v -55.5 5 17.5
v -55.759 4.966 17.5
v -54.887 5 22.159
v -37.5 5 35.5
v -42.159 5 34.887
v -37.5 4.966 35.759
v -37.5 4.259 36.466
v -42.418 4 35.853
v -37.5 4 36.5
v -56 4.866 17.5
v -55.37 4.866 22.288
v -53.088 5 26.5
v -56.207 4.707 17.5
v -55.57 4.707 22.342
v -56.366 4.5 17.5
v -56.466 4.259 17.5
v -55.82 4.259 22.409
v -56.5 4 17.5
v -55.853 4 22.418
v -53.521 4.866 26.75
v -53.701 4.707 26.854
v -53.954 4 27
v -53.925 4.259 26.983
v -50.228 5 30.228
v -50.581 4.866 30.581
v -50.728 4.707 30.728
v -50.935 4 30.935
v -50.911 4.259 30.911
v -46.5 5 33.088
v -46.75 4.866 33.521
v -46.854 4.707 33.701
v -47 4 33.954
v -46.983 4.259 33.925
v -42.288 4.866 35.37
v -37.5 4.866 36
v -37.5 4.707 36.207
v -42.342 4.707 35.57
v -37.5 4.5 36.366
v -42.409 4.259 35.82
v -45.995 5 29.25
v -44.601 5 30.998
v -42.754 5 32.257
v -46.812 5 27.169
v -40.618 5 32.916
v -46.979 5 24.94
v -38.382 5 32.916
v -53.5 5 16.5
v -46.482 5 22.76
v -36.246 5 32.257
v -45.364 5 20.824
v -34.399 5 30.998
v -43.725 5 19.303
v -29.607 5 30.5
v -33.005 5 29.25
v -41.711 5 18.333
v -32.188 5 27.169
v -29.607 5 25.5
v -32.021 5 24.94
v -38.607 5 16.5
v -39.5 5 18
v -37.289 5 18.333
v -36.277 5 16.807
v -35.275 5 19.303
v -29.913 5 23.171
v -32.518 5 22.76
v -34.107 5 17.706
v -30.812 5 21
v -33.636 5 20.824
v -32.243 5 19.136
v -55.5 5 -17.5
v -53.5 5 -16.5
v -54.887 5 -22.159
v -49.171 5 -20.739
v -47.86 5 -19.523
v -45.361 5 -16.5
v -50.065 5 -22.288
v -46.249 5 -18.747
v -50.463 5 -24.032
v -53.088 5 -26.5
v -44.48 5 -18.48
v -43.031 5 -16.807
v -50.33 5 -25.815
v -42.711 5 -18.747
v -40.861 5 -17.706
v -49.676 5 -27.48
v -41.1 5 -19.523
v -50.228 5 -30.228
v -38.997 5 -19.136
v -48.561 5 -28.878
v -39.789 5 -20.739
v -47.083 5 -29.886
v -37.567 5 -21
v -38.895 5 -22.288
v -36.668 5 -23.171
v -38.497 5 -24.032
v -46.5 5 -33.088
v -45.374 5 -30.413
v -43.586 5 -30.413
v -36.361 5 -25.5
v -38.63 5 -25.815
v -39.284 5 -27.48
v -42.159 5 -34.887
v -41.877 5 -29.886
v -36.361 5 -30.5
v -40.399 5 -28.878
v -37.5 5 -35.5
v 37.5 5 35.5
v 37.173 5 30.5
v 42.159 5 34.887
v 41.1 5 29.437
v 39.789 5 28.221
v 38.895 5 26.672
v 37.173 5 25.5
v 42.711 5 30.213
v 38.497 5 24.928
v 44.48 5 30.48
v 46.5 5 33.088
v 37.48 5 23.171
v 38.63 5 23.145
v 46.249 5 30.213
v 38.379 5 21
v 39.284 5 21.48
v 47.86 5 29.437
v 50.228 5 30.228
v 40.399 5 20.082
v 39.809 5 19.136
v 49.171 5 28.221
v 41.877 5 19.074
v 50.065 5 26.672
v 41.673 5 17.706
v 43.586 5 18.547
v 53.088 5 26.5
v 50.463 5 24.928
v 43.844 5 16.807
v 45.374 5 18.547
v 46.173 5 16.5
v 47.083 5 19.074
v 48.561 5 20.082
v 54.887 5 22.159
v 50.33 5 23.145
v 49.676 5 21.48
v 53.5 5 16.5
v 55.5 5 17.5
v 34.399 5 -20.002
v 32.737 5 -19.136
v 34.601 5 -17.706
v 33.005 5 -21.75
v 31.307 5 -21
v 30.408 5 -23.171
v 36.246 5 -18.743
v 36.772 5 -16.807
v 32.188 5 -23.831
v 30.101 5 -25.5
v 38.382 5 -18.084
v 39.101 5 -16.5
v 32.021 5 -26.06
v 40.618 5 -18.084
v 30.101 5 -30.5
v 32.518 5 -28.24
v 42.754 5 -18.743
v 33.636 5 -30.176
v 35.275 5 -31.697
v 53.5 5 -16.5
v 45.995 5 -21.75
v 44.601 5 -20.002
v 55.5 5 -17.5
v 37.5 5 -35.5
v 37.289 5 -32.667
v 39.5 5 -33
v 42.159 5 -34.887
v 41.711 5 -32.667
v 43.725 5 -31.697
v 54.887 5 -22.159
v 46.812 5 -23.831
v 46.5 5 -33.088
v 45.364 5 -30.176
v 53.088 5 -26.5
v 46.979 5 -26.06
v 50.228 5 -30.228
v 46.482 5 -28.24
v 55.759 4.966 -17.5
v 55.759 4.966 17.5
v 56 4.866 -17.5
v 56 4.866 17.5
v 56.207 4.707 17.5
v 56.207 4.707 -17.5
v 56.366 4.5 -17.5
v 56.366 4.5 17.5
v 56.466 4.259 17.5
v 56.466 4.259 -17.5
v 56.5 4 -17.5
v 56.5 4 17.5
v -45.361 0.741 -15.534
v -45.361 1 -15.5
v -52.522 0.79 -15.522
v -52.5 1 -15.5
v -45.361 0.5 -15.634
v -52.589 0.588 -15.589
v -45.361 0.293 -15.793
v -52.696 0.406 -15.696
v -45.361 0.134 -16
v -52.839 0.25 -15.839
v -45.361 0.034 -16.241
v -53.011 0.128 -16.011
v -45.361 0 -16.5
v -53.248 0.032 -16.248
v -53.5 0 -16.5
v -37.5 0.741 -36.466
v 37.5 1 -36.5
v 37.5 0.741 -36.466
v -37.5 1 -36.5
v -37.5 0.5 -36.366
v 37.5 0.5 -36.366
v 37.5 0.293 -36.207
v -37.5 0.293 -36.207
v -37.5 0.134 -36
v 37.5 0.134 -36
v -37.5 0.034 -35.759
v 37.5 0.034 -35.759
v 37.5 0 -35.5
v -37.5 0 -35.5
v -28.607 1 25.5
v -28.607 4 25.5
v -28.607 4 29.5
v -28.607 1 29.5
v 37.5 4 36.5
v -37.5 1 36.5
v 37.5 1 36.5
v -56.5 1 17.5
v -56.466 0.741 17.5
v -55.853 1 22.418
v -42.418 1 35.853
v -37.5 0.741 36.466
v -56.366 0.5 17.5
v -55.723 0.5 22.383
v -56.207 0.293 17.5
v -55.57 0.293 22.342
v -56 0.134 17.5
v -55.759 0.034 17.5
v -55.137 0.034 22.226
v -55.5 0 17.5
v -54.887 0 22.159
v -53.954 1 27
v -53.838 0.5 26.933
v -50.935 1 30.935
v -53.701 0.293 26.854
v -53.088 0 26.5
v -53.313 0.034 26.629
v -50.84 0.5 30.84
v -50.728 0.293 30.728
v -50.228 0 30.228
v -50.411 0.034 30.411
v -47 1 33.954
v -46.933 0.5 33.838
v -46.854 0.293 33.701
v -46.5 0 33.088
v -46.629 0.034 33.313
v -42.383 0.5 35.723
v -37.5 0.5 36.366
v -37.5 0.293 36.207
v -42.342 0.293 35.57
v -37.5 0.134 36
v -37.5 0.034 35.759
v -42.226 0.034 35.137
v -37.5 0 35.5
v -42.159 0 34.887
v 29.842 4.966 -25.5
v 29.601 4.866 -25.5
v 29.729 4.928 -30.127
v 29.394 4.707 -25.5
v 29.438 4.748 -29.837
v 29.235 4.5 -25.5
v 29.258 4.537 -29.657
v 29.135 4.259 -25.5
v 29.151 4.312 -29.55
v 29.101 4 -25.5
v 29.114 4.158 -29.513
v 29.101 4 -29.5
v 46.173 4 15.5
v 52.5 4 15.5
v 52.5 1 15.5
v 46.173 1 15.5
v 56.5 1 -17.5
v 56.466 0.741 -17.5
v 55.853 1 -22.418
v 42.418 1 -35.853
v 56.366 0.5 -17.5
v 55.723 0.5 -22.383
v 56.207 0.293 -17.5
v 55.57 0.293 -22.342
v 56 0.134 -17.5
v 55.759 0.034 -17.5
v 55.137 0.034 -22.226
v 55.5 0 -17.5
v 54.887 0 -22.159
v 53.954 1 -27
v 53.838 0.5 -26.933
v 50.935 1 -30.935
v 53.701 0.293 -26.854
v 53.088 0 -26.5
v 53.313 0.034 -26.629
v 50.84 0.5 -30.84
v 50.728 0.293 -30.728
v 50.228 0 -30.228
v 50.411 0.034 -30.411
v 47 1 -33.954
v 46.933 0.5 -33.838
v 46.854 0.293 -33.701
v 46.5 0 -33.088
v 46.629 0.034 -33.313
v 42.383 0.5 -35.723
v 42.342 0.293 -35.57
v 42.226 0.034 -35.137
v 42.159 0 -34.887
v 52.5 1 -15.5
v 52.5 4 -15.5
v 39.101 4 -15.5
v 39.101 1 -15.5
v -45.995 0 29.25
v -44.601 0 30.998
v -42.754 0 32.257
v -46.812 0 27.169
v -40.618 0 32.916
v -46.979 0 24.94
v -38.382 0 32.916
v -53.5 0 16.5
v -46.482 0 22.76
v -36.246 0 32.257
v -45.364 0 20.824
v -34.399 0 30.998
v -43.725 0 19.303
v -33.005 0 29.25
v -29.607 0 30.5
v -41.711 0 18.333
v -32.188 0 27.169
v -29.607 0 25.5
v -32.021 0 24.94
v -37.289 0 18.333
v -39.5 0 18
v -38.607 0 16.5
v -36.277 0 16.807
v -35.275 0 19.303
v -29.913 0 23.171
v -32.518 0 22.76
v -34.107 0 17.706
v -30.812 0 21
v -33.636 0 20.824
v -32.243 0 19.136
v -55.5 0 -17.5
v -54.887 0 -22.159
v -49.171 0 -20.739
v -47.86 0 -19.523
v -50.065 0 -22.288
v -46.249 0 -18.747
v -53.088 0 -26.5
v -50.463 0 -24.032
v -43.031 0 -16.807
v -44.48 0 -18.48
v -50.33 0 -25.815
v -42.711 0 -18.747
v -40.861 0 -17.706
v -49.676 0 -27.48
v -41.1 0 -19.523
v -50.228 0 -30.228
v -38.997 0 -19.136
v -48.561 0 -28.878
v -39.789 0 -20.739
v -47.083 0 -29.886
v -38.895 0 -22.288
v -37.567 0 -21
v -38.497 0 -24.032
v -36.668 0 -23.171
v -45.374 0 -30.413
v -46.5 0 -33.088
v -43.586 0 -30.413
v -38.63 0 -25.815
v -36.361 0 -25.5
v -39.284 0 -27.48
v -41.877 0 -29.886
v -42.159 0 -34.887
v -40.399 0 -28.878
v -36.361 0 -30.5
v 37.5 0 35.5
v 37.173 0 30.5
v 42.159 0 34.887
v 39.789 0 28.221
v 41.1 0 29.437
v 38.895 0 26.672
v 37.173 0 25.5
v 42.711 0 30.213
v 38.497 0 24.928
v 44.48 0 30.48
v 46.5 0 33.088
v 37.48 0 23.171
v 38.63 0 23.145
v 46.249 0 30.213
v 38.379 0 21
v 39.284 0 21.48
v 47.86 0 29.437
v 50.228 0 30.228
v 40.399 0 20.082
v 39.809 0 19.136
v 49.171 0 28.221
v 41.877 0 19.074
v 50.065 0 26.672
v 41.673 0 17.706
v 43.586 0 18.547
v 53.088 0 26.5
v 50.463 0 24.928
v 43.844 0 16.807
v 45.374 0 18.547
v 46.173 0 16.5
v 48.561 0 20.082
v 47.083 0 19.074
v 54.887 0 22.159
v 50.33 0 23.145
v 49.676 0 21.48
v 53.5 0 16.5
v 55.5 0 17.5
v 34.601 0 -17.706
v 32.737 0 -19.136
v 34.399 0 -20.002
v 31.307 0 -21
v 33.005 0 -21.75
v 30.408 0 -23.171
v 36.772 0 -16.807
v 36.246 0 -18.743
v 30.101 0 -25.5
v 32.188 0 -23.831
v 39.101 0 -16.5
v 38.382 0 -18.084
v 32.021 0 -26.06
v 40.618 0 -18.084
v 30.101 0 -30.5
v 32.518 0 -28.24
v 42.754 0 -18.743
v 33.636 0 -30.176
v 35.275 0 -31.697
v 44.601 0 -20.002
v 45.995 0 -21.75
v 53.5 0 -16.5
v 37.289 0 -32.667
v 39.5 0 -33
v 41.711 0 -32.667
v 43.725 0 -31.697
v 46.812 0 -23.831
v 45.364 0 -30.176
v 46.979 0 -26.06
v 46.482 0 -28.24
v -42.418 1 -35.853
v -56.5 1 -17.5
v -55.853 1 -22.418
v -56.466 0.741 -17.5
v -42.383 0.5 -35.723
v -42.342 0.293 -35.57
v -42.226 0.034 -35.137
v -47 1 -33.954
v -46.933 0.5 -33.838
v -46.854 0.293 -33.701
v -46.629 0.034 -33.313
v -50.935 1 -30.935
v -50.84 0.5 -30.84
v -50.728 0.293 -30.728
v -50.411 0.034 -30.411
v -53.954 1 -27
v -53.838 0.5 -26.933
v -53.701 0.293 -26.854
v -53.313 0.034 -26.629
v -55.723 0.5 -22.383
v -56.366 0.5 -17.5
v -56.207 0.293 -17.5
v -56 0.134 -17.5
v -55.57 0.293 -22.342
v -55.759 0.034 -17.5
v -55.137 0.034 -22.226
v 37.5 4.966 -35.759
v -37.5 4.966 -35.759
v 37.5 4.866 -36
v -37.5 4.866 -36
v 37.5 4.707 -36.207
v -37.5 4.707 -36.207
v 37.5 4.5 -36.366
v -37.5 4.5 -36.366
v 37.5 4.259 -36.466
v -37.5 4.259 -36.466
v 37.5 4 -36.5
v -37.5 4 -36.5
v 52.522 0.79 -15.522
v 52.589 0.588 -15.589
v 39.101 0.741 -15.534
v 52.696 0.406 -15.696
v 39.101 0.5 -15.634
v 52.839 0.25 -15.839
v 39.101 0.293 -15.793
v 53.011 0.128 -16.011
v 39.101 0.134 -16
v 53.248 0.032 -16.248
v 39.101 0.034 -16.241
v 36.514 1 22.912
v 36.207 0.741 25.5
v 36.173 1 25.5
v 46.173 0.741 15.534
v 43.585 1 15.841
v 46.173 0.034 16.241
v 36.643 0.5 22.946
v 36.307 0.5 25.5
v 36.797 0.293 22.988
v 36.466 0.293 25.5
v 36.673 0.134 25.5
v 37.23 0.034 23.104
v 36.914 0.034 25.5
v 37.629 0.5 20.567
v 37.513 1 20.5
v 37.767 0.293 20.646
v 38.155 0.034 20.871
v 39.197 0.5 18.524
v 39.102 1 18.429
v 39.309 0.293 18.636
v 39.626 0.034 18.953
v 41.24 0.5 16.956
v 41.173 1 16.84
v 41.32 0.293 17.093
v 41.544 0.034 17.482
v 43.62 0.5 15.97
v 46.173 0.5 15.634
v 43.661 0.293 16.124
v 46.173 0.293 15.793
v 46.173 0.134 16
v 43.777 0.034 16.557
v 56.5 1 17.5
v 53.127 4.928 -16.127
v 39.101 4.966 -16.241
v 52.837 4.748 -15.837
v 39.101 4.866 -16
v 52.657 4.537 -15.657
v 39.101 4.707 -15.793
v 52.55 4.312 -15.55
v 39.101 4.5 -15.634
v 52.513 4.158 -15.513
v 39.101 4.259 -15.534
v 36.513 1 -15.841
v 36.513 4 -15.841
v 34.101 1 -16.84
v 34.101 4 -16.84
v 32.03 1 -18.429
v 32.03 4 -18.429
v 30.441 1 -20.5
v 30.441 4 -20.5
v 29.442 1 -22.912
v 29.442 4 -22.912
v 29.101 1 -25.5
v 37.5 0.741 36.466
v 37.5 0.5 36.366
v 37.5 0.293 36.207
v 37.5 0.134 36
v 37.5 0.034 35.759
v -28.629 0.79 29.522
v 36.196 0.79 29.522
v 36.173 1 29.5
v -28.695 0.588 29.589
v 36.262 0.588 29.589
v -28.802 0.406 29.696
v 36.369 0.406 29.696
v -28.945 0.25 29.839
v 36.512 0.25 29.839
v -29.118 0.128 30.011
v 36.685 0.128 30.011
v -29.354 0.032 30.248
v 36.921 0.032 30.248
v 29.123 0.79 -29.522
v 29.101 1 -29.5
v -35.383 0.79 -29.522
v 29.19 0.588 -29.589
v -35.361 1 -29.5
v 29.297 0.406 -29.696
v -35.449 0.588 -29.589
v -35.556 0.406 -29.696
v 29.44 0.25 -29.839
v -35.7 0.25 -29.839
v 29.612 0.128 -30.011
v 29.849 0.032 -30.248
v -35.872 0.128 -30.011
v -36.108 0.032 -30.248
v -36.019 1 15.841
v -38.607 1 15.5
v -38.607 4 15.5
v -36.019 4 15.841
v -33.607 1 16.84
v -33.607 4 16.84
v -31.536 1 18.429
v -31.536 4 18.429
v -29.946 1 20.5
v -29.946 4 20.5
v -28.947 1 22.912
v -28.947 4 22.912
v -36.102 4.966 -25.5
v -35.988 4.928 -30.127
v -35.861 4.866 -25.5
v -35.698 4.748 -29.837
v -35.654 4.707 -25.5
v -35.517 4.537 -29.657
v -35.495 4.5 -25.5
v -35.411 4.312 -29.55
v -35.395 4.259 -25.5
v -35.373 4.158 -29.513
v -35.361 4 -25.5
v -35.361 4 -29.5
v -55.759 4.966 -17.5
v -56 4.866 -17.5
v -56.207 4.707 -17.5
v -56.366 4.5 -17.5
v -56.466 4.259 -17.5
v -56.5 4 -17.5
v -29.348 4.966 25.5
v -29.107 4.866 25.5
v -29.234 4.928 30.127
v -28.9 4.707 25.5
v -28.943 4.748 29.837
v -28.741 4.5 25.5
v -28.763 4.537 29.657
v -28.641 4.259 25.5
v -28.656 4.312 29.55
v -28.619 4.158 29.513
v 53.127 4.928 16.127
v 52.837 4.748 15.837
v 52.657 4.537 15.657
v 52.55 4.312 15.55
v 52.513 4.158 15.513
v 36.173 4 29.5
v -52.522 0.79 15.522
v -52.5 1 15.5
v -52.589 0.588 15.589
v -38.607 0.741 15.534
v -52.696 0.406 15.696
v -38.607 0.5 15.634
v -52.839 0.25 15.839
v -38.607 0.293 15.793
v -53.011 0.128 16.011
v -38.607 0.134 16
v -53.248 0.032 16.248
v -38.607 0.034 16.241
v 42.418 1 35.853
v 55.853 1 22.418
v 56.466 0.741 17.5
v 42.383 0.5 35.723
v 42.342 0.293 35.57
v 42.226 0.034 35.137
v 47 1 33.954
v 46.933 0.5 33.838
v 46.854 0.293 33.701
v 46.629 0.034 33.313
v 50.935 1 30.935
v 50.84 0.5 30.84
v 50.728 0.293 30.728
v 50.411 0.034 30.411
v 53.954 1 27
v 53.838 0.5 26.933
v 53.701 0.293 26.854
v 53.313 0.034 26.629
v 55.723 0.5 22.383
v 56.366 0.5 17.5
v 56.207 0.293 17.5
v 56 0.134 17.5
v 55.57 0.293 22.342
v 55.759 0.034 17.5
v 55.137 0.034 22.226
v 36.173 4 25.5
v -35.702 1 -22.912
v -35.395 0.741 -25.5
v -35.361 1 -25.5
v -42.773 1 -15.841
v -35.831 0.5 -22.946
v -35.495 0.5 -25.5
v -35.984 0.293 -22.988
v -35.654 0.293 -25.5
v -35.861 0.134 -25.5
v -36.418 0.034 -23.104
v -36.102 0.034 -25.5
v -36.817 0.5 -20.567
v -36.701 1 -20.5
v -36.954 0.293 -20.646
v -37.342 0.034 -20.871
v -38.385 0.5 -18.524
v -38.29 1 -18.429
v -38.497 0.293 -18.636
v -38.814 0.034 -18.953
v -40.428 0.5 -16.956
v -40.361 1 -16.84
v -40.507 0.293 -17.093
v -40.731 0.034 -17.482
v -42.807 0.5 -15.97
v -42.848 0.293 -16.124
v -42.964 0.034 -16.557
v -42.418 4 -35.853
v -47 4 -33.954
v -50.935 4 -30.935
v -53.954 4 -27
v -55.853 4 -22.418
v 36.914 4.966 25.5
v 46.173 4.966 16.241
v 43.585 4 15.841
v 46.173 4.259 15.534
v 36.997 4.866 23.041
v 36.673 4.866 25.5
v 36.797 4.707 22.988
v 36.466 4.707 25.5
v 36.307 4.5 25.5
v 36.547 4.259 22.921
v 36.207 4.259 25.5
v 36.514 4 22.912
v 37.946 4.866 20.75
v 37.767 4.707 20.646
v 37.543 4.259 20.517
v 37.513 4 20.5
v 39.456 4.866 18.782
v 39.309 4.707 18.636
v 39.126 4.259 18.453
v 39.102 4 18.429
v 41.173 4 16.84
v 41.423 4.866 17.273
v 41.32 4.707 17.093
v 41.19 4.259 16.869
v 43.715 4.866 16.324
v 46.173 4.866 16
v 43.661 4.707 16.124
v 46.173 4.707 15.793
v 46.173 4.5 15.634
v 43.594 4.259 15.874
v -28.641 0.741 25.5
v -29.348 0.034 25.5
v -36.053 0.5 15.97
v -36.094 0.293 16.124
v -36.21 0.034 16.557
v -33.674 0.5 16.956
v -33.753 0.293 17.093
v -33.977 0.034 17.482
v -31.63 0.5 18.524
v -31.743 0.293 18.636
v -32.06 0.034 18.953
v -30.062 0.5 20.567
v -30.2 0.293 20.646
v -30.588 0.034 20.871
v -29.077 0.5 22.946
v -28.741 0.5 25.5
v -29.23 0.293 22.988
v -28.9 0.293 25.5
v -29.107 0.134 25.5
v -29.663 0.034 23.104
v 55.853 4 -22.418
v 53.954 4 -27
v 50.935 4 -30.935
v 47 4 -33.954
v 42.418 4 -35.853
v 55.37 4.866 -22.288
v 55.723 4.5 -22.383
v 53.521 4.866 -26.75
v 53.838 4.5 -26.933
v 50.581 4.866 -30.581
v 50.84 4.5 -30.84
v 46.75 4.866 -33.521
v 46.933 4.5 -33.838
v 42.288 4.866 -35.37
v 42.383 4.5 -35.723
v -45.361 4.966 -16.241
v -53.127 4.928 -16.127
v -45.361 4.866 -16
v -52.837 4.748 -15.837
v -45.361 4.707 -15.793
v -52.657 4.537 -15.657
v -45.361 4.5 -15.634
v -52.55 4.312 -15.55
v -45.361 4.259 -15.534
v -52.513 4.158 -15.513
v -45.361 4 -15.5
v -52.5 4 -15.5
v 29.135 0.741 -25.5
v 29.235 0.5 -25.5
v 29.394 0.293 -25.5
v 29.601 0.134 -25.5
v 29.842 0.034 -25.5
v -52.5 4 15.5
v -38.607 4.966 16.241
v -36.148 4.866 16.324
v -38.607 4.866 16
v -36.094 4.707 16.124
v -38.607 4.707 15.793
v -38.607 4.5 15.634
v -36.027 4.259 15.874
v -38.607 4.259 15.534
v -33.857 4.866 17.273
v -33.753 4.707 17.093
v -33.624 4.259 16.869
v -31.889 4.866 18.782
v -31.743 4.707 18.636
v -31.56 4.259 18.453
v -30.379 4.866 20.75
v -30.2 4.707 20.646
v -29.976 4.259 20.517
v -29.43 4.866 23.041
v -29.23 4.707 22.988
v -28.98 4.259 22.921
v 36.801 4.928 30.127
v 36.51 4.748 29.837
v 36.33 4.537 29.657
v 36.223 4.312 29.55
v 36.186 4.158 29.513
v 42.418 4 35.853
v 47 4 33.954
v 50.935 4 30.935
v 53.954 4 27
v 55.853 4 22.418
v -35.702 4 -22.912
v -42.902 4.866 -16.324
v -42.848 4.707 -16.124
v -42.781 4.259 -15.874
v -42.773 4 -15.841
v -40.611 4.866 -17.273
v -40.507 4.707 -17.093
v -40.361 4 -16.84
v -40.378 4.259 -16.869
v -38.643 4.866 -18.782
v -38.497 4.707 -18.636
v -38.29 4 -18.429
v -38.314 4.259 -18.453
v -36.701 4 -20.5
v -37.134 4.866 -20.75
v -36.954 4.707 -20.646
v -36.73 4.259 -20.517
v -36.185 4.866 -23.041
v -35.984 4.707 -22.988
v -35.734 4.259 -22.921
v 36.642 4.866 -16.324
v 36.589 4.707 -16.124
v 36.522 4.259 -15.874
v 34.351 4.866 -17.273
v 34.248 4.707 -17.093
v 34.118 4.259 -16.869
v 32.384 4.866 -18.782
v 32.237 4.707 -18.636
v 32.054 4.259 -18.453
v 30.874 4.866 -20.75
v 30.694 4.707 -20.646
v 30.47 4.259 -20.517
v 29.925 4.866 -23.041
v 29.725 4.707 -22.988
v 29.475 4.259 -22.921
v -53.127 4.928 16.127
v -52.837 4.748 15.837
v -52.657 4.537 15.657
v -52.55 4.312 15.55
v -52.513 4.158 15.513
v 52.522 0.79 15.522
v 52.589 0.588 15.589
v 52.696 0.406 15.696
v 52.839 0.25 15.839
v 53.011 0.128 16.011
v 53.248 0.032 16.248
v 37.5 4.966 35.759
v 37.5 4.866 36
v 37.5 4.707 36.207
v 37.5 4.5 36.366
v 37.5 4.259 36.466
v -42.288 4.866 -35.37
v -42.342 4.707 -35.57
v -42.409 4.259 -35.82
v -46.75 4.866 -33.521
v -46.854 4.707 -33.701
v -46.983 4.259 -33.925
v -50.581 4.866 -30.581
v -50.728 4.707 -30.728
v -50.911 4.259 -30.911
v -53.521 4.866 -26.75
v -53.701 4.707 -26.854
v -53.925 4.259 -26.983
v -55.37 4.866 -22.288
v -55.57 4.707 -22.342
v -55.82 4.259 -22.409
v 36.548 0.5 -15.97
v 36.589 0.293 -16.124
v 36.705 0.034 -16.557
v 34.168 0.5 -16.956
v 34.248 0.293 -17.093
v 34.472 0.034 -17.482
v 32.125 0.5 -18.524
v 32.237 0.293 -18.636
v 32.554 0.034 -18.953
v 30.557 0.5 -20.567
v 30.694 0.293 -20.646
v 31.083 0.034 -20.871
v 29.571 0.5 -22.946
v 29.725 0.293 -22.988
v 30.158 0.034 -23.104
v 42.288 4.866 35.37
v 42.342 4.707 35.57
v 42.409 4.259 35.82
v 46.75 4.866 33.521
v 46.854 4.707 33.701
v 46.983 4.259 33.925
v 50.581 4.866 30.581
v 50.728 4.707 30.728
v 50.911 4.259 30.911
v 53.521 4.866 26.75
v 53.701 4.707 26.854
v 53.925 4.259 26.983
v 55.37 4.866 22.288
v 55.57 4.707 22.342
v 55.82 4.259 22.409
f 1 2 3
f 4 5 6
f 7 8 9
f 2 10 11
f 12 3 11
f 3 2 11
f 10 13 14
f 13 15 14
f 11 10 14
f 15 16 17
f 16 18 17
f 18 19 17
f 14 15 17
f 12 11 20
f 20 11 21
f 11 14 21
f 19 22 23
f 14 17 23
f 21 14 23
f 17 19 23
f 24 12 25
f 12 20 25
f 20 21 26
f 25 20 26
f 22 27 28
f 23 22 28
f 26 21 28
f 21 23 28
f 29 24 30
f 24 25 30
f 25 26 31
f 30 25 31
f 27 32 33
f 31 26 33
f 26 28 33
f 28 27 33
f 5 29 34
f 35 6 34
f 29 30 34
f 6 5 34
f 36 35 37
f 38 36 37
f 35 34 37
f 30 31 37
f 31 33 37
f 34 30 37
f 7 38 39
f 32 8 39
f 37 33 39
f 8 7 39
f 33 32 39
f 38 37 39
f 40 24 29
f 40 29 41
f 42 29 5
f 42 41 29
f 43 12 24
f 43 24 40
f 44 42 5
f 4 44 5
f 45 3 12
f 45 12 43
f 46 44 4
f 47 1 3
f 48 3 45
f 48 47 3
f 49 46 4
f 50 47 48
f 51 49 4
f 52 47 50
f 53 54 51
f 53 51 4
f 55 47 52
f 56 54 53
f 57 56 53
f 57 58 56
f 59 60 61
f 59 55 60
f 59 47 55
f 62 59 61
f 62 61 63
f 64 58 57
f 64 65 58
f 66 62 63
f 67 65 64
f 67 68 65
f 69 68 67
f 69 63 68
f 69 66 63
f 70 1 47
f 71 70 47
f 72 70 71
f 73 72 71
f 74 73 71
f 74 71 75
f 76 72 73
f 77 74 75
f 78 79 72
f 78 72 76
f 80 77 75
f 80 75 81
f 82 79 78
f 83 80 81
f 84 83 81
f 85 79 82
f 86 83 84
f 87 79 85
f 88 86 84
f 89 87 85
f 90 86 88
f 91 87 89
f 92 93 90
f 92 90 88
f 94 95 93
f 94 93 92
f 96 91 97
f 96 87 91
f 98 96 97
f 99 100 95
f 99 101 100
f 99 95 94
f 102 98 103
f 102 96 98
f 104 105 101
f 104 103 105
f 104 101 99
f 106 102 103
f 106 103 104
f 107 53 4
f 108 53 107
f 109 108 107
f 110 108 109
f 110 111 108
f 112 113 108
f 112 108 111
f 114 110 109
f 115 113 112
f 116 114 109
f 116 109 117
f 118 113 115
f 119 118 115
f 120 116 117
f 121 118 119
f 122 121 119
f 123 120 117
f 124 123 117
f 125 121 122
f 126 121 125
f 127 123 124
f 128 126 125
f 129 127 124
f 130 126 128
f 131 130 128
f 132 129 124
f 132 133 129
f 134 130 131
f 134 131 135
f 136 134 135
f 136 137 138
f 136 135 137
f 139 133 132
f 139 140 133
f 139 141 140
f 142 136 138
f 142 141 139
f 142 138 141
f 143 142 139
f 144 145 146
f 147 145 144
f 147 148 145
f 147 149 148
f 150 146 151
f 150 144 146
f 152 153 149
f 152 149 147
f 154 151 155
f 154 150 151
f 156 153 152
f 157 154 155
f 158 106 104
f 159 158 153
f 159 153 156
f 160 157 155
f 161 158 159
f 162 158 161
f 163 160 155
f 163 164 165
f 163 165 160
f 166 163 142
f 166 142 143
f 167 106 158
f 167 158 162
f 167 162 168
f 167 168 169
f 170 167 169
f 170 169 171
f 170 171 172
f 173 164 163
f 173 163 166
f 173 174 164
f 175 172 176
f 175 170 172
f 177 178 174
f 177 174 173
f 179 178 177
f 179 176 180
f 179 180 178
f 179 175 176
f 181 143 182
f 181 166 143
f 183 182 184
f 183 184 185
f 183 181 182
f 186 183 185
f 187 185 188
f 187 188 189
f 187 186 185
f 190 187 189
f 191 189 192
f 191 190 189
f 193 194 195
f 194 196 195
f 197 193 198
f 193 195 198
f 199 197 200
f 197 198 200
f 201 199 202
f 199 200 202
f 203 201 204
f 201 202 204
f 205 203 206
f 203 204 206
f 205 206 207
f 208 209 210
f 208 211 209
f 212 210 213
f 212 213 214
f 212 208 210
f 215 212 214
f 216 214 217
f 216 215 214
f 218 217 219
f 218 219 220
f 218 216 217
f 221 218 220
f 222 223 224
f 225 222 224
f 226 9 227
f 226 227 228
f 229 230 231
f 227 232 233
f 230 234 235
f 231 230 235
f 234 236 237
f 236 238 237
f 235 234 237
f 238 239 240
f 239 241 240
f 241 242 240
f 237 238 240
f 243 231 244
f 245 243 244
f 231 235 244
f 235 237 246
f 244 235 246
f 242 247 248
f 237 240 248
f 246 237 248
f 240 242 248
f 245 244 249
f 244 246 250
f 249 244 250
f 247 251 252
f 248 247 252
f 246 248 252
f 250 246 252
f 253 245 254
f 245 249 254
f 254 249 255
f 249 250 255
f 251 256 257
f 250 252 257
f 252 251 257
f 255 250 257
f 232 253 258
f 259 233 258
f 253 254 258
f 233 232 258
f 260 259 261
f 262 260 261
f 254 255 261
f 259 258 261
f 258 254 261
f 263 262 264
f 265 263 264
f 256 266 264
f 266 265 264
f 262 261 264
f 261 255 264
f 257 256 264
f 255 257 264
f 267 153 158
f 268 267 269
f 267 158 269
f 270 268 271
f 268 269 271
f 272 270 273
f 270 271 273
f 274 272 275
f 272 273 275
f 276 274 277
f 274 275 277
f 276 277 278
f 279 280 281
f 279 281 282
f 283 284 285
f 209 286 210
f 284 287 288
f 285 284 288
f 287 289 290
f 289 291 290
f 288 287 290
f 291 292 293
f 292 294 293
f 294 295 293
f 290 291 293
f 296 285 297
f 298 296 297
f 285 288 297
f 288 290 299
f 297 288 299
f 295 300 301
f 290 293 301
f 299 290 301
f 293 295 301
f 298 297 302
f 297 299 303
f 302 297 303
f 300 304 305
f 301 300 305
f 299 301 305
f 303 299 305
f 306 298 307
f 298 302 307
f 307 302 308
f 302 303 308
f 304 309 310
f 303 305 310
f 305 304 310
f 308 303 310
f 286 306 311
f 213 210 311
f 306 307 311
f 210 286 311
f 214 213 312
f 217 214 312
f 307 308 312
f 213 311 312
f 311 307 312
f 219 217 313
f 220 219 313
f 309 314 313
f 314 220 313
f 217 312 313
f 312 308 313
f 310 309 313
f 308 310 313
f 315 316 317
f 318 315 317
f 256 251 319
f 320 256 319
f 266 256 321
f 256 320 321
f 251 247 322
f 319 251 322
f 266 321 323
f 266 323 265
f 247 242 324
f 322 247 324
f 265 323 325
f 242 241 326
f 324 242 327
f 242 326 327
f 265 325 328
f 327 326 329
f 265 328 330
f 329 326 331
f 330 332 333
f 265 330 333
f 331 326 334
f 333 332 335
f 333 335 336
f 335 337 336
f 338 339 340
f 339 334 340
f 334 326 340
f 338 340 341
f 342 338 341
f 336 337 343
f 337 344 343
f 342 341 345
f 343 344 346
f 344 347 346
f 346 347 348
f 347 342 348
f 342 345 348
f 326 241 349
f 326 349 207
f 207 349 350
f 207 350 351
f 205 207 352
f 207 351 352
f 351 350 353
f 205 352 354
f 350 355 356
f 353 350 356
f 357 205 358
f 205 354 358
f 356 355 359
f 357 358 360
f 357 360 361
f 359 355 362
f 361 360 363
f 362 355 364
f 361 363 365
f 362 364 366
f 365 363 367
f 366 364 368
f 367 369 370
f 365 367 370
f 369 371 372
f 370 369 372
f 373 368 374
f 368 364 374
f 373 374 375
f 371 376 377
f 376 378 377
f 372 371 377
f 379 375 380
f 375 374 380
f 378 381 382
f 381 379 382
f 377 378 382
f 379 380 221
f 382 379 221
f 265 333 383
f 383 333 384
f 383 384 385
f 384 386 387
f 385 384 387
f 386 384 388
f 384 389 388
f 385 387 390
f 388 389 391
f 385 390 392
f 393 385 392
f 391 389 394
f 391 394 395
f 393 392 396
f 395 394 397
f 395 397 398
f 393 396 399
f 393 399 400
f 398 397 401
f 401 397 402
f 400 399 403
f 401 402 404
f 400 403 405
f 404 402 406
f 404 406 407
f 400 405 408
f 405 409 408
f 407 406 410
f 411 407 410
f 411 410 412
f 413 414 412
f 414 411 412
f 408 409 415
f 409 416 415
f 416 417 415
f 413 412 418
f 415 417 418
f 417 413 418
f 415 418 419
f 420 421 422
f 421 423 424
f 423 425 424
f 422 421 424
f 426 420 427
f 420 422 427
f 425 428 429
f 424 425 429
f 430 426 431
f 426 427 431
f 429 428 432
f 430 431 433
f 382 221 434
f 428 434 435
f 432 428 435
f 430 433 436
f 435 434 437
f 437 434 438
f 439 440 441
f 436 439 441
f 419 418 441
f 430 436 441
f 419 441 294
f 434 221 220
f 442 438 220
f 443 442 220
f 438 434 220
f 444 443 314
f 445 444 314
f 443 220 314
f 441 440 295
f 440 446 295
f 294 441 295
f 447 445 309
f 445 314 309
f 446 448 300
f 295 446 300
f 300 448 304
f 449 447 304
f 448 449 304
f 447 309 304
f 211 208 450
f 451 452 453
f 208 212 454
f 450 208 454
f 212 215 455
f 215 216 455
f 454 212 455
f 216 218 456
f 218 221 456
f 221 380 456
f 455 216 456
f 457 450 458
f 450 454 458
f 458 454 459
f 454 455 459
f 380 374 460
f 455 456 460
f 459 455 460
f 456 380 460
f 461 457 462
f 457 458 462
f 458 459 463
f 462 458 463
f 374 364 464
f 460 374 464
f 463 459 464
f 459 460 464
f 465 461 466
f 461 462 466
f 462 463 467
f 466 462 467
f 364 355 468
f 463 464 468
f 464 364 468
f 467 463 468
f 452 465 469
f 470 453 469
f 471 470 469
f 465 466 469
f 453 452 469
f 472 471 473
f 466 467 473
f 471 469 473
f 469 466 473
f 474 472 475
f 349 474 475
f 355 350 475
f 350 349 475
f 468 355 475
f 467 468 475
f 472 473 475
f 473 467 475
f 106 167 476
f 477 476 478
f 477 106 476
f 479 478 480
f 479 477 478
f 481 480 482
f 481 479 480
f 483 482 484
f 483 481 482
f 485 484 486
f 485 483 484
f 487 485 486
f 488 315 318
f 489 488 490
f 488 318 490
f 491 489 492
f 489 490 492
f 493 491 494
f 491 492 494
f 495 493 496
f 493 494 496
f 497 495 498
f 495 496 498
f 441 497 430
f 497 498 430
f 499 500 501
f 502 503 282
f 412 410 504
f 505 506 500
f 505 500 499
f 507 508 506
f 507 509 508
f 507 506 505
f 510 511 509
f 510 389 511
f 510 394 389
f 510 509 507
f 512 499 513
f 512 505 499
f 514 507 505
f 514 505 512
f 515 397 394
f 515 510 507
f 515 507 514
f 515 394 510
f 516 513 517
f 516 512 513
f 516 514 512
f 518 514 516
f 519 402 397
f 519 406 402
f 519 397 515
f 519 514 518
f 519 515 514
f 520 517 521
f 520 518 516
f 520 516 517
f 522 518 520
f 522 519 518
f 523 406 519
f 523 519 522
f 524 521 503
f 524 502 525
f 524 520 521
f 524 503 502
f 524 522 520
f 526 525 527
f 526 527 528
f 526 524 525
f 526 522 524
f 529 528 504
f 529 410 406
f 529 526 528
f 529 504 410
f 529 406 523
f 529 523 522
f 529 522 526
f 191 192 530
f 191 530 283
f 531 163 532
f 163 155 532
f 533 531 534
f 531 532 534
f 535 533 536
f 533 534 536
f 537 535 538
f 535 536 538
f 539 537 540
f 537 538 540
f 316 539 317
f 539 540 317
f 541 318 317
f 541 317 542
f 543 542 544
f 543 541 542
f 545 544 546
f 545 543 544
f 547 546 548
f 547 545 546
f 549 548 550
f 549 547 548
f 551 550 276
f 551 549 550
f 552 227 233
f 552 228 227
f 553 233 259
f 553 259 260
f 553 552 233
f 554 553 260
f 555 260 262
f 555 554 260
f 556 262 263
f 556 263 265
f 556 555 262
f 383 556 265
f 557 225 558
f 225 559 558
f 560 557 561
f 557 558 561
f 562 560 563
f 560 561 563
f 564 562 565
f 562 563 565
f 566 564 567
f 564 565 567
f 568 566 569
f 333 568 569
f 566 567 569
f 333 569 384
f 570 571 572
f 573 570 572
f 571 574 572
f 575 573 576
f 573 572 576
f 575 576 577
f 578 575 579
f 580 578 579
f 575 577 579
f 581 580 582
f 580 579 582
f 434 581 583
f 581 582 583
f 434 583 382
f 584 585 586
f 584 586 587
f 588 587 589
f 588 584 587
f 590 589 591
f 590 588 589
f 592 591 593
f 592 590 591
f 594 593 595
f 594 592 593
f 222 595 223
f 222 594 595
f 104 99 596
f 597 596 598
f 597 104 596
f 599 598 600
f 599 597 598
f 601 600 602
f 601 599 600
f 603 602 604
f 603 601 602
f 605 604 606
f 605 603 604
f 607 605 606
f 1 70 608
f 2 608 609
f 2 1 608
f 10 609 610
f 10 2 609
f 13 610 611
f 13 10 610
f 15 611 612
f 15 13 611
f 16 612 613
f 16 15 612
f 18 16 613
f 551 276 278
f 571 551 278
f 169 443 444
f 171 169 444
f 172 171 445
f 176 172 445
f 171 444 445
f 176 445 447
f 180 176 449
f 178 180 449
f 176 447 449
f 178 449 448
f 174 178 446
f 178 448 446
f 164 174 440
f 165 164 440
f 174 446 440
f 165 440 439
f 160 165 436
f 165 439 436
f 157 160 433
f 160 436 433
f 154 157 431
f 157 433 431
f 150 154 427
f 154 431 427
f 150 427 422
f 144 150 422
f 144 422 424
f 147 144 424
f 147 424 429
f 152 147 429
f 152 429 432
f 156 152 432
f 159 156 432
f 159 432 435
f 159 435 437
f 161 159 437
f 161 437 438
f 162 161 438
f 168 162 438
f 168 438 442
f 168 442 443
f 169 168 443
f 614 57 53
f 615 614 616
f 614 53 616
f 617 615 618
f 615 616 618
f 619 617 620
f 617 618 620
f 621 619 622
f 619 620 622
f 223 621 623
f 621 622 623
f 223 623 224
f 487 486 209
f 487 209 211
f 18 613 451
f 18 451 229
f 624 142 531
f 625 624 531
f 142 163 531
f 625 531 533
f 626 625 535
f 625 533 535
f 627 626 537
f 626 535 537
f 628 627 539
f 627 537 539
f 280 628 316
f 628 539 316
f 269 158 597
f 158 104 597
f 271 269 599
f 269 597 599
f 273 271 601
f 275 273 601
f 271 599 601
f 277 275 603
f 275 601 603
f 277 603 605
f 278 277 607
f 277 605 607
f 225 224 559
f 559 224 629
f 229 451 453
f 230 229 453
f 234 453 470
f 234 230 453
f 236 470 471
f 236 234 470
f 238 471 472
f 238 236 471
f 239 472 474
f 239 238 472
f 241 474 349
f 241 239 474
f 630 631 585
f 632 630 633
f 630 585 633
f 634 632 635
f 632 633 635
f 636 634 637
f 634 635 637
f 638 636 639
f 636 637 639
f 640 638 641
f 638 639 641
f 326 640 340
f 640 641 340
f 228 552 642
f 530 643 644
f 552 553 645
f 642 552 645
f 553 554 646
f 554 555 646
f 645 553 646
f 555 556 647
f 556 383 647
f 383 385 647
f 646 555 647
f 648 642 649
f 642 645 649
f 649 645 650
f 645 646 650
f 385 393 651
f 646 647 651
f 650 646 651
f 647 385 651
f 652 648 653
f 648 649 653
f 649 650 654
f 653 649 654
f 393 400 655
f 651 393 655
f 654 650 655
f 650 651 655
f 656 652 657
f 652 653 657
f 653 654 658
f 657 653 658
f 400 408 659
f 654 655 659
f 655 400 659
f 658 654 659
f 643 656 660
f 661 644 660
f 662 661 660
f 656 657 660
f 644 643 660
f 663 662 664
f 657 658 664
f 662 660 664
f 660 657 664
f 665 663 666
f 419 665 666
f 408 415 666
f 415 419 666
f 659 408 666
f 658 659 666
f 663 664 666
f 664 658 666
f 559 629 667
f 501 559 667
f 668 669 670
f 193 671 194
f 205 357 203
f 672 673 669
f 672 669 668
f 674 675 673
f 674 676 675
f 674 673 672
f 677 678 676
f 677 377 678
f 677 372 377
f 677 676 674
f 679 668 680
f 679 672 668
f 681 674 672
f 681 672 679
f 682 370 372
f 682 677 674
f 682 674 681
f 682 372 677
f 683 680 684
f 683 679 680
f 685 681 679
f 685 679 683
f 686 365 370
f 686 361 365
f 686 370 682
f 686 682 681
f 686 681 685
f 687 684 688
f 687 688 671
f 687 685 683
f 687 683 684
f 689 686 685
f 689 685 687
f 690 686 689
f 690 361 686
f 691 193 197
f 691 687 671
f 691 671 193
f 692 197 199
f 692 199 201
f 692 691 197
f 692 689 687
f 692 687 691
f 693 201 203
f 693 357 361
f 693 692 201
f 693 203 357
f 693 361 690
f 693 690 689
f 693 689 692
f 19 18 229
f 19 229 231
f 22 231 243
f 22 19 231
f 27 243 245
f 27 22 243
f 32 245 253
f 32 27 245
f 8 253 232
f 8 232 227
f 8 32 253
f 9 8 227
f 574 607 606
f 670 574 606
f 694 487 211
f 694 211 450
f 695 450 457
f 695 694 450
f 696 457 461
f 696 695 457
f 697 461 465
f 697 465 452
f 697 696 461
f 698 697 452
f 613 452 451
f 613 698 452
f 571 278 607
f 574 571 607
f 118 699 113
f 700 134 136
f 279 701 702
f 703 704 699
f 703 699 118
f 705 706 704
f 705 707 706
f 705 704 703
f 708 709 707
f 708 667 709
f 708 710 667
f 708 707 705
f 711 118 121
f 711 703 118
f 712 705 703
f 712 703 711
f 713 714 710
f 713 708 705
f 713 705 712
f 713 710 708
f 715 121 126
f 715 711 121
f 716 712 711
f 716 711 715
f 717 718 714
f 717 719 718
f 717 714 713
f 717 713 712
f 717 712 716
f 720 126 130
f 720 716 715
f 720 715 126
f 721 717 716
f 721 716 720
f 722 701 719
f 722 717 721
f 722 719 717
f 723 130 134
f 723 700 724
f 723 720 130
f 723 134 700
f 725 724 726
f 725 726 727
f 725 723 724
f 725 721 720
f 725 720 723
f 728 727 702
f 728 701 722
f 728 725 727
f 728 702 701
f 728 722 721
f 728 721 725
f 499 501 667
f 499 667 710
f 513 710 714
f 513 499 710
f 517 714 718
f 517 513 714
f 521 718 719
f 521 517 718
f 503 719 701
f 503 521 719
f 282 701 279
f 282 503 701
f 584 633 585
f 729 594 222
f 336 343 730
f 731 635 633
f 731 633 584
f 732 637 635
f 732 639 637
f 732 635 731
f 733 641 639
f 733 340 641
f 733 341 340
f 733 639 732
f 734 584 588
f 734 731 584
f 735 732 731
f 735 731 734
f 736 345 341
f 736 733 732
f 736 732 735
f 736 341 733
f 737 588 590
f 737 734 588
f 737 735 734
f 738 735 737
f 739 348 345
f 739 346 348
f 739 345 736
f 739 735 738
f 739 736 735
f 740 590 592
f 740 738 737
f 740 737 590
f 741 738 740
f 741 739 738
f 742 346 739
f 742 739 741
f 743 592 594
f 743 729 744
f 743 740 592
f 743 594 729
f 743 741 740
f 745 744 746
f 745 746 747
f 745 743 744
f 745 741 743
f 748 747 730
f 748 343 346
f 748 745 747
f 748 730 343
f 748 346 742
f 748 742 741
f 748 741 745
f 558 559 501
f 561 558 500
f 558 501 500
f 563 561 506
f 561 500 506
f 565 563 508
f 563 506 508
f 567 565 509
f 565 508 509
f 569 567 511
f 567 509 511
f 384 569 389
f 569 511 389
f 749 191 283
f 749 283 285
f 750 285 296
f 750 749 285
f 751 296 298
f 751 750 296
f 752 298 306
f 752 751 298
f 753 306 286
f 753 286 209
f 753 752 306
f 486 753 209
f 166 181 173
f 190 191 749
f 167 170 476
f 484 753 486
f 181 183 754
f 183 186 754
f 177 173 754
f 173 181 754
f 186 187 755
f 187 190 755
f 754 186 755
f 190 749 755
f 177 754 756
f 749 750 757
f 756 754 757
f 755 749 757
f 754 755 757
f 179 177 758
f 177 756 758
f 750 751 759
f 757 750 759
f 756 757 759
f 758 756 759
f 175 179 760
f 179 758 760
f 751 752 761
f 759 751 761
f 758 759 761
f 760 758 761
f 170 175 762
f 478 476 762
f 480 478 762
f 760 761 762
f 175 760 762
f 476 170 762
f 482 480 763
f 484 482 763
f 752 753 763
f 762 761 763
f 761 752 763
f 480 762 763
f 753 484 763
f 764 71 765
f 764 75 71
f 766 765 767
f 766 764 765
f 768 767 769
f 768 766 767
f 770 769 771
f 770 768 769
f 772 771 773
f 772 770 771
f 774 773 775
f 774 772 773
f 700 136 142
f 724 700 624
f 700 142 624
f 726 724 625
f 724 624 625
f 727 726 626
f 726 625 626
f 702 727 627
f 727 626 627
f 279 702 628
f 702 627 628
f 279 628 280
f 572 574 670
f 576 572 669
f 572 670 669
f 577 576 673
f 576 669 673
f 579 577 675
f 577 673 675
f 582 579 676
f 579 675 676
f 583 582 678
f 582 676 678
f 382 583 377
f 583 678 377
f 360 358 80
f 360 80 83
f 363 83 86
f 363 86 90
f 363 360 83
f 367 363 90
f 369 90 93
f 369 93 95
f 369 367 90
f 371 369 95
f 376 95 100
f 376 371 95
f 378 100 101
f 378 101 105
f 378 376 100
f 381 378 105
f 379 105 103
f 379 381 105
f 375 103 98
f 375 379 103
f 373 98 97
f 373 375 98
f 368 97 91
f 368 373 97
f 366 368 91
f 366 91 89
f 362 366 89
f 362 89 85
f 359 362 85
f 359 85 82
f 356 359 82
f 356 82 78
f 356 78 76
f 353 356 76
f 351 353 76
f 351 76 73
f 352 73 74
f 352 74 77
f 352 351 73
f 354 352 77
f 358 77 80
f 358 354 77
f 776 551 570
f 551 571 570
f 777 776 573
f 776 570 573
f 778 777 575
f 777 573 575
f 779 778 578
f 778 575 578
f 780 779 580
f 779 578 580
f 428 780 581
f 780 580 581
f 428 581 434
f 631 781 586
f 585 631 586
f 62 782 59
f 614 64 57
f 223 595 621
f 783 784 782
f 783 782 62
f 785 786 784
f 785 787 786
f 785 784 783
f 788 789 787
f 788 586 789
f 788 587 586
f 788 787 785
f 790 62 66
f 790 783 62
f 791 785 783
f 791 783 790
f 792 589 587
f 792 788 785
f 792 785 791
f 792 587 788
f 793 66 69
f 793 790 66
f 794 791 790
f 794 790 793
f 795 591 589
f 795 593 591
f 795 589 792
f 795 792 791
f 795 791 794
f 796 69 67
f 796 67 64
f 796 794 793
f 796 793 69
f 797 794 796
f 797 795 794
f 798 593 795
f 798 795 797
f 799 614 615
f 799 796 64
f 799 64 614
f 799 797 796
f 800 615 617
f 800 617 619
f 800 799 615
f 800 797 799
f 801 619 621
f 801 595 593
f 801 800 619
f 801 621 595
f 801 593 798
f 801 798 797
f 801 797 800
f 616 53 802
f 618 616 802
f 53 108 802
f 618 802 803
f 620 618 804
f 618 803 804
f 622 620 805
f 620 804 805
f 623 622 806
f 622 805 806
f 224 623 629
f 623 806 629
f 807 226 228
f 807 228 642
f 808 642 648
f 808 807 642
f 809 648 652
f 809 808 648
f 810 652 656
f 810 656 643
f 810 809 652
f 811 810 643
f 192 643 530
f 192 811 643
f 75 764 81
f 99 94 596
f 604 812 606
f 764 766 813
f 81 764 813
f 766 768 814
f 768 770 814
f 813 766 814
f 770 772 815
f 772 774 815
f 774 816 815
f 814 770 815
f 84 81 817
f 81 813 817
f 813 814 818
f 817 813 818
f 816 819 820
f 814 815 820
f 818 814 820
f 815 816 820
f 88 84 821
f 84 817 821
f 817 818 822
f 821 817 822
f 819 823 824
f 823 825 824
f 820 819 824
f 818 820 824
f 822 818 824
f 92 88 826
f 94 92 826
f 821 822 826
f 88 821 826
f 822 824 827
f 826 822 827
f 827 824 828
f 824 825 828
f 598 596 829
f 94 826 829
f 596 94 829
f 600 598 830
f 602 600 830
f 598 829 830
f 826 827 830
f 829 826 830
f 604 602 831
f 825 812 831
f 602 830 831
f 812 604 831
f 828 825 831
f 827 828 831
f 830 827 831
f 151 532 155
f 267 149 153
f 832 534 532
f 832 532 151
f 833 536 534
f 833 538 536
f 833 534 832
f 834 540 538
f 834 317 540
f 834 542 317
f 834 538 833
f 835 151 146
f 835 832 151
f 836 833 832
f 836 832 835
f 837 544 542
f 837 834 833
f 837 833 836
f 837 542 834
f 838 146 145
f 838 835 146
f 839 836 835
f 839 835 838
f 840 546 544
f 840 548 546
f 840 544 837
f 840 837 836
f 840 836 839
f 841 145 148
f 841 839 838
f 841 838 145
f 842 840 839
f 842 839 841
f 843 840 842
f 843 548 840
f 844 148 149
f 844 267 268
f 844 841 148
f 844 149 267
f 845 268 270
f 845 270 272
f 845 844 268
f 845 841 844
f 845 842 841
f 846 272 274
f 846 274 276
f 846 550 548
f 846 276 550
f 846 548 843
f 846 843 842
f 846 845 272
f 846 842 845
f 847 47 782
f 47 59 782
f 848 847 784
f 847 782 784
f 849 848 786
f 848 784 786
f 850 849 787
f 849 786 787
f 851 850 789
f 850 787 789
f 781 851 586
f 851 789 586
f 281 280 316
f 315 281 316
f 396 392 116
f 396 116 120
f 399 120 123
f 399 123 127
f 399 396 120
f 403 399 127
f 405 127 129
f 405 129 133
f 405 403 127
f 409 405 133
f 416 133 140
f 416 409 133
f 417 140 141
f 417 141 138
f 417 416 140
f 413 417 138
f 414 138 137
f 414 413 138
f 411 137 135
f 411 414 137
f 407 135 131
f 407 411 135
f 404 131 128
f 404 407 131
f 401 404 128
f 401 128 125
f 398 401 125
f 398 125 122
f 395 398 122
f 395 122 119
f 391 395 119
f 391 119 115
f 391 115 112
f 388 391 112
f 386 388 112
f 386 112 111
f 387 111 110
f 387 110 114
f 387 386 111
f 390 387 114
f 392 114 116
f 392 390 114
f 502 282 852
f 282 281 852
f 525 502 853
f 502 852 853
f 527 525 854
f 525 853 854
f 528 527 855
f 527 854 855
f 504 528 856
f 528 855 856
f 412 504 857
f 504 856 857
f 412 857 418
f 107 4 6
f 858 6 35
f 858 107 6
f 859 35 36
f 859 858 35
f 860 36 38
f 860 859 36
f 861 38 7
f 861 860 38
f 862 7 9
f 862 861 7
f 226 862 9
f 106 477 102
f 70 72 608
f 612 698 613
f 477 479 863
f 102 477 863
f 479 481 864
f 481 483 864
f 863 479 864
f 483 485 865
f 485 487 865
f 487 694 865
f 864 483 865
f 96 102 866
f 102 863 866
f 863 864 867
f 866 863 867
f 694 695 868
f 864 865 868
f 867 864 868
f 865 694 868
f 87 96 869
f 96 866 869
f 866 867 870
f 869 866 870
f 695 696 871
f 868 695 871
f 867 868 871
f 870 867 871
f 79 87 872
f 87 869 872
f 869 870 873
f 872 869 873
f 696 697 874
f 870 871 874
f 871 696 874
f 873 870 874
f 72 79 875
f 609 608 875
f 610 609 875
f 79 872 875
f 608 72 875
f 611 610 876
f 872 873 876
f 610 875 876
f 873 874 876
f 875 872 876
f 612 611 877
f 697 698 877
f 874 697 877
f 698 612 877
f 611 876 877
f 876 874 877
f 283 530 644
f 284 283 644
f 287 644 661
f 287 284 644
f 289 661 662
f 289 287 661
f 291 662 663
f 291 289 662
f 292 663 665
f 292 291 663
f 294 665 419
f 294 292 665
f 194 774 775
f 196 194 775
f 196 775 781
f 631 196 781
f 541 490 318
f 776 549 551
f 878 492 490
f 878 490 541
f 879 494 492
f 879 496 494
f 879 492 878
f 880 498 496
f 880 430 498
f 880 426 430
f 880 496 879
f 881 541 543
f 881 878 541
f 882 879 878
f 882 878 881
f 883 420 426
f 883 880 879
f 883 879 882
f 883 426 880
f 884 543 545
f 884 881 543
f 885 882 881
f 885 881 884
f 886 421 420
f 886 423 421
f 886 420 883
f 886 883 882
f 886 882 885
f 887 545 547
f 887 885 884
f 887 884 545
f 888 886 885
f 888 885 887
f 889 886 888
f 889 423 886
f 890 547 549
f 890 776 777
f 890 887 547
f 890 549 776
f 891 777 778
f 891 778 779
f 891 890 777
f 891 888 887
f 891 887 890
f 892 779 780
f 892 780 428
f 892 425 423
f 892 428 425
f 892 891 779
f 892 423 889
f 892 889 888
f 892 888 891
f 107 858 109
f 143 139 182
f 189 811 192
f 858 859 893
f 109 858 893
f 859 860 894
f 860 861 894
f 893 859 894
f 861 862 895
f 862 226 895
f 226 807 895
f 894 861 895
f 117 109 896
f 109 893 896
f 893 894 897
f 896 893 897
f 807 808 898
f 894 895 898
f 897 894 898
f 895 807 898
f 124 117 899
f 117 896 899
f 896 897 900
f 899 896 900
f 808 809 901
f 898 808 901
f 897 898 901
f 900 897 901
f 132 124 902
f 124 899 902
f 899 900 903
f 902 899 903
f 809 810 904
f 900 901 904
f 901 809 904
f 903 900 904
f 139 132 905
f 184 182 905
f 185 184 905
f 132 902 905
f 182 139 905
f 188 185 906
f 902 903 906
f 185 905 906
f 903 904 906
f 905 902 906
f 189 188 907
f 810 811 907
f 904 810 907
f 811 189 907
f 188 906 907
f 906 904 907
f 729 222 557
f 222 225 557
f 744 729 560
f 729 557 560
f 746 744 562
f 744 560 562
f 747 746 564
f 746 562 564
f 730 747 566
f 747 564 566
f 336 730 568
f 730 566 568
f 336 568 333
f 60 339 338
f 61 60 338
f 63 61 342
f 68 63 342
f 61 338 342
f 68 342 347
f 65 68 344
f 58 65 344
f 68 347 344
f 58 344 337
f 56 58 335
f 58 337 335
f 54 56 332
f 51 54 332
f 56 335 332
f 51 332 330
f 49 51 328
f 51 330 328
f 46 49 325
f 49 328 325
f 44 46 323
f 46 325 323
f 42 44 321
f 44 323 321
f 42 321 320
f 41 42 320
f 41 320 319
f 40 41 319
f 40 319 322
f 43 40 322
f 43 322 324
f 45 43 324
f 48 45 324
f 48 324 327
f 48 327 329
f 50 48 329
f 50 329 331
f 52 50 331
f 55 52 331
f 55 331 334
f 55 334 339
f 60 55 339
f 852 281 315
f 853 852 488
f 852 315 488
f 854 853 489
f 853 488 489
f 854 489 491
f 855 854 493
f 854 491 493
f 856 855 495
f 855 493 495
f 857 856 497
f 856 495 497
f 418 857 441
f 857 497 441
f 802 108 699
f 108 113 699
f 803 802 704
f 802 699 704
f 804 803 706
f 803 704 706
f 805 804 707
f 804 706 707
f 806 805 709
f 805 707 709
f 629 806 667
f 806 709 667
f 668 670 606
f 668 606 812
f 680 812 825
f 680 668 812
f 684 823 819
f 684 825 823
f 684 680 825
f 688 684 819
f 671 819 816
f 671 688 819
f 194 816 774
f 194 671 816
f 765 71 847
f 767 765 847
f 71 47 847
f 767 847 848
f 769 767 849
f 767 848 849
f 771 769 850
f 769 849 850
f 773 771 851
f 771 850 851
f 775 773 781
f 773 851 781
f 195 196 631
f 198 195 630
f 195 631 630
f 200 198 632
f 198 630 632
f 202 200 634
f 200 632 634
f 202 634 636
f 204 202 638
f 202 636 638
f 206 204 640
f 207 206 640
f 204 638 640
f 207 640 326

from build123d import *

# Parameters (mm, degrees)
SKETCH1_W           = 115
SKETCH1_H           = 75
SKETCH1_R           = 6
BOSS_EXTRUDE1_DEPTH = 5
CUT_EXTRUDE1_DEPTH  = 5
FILLET1_R           = 20
SKETCH5_R           = 7.5
CUT_EXTRUDE4_DEPTH  = 10
SKETCH9_W           = 57.70776026
SKETCH9_H           = 31
CUT_EXTRUDE5_DEPTH  = 10
FILLET2_R           = 10
CUT_EXTRUDE7_DEPTH  = 16
FILLET3_R           = 1


with BuildPart() as part:
    # Sketch1 → Boss-Extrude1 (new body)
    with BuildSketch(Plane(origin=(0, 0, 0), x_dir=(1, 0, 0), z_dir=(0, 1, 0))):
        Rectangle(SKETCH1_W, SKETCH1_H)
        with Locations(Location((-44.48, 24.48, 0), (0, 0, 270))):
            Circle(SKETCH1_R, mode=Mode.SUBTRACT)
        with Locations(Location((44.48, -24.48, 0), (0, 0, 270))):
            Circle(SKETCH1_R, mode=Mode.SUBTRACT)
    extrude(amount=BOSS_EXTRUDE1_DEPTH)

    # Sketch2 → Cut-Extrude1 (cut)
    with BuildSketch(Plane(origin=(0, 5, 0), x_dir=(1, 0, 0), z_dir=(0, 1, 0))):
        with BuildLine():
            Line((-41.5, 15.5), (41.5, 15.5))
            ThreePointArc((41.5, 15.5), (48.571067812, 12.571067812), (51.5, 5.5))
            Line((51.5, 5.5), (51.5, -5.5))
            ThreePointArc((51.5, -5.5), (48.571067812, -12.571067812), (41.5, -15.5))
            Line((41.5, -15.5), (-41.5, -15.5))
            ThreePointArc((-41.5, -15.5), (-48.571067812, -12.571067812), (-51.5, -5.5))
            Line((-51.5, -5.5), (-51.5, 5.5))
            ThreePointArc((-51.5, 5.5), (-48.571067812, 12.571067812), (-41.5, 15.5))
        make_face()
    extrude(amount=-CUT_EXTRUDE1_DEPTH, mode=Mode.SUBTRACT)

    # Fillet1
    fillet1_edges = [part.edges().sort_by_distance(p)[0] for p in [
        (57.5, 2.5, 37.5),
        (-57.5, 2.5, 37.5),
        (-57.5, 2.5, -37.5),
        (57.5, 2.5, -37.5),
    ]]
    fillet(fillet1_edges, radius=FILLET1_R)

    # Sketch5 → Cut-Extrude4 (cut)
    with BuildSketch(Plane.XZ):
        with Locations(Location((-39.5, 25.5, 0), (0, 0, 270))):
            Circle(SKETCH5_R)
        with Locations(Location((39.5, -25.5, 0), (0, 0, 270))):
            Circle(SKETCH5_R)
    extrude(amount=-CUT_EXTRUDE4_DEPTH, mode=Mode.SUBTRACT)

    # Sketch9 → Cut-Extrude5 (cut)
    with BuildSketch(Plane(origin=(0, 5, 0), x_dir=(1, 0, 0), z_dir=(0, 1, 0))):
        Polygon((-35.360842569, 29.5), (-35.360842569, 15.5), (-28.606695745, 15.5), (29.101064515, 15.5), (29.101064515, 29.5), align=None)
        Polygon((-28.606695745, 15.5), (-35.360842569, 15.5), (-52.5, 15.5), (-52.5, -15.5), (-28.606695745, -15.5), align=None)
        with Locations((0.247184385, 0)):
            Rectangle(SKETCH9_W, SKETCH9_H)
        Polygon((52.5, 15.5), (29.101064515, 15.5), (29.101064515, -15.5), (36.173307785, -15.5), (52.5, -15.5), align=None)
        Polygon((29.101064515, -15.5), (-28.606695745, -15.5), (-28.606695745, -29.5), (36.173307785, -29.5), (36.173307785, -15.5), align=None)
    extrude(amount=-CUT_EXTRUDE5_DEPTH, mode=Mode.SUBTRACT)

    # Fillet2
    fillet2_edges = [part.edges().sort_by_distance(p)[0] for p in [
        (-35.360842569, 2.5, -15.5),
        (29.101064515, 2.5, -15.5),
        (36.173307785, 2.5, 15.5),
        (-28.606695745, 2.5, 15.5),
    ]]
    fillet(fillet2_edges, radius=FILLET2_R)

    # Sketch11 → Cut-Extrude7 (cut)
    with BuildSketch(Plane(origin=(0, 5, 0), x_dir=(1, 0, 0), z_dir=(0, 1, 0))):
        with BuildLine():
            Line((57.5, -17.5), (57.5, 17.5))
            ThreePointArc((57.5, 17.5), (51.642135624, 31.642135624), (37.5, 37.5))
            Line((37.5, 37.5), (-37.5, 37.5))
            ThreePointArc((-37.5, 37.5), (-51.642135624, 31.642135624), (-57.5, 17.5))
            Line((-57.5, 17.5), (-57.5, -17.5))
            ThreePointArc((-57.5, -17.5), (-51.642135624, -31.642135624), (-37.5, -37.5))
            Line((-37.5, -37.5), (37.5, -37.5))
            ThreePointArc((37.5, -37.5), (51.642135624, -31.642135624), (57.5, -17.5))
        make_face()
        with BuildLine():
            Line((37.5, 36.5), (-37.5, 36.5))
            ThreePointArc((-37.5, 36.5), (-50.935028843, 30.935028843), (-56.5, 17.5))
            Line((-56.5, 17.5), (-56.5, -17.5))
            ThreePointArc((-56.5, -17.5), (-50.935028843, -30.935028843), (-37.5, -36.5))
            Line((-37.5, -36.5), (37.5, -36.5))
            ThreePointArc((37.5, -36.5), (50.935028843, -30.935028843), (56.5, -17.5))
            Line((56.5, -17.5), (56.5, 17.5))
            ThreePointArc((56.5, 17.5), (50.935028843, 30.935028843), (37.5, 36.5))
        make_face(mode=Mode.SUBTRACT)
    extrude(amount=-CUT_EXTRUDE7_DEPTH, mode=Mode.SUBTRACT)

    # Fillet3
    fillet3_edges = [part.edges().sort_by_distance(p)[0] for p in [
        (52.5, 5, 0),
        (3.78330602, 5, 29.5),
        (-52.5, 0, 0),
        (-3.129889027, 0, -29.5),
        (-3.129889027, 5, -29.5),
        (-52.5, 5, 0),
        (36.173307785, 0, 27.5),
        (36.173307785, 5, 27.5),
        (29.101064515, 0, -27.5),
        (-35.360842569, 0, -27.5),
        (-48.930421284, 0, -15.5),
        (-28.606695745, 0, 27.5),
        (49.336653893, 0, 15.5),
        (32.029996703, 0, -18.428932188),
        (-38.289774757, 0, -18.428932188),
        (-31.535627933, 0, 18.428932188),
        (39.102239973, 0, 18.428932188),
        (49.336653893, 5, 15.5),
        (29.101064515, 5, -27.5),
        (-28.606695745, 5, 27.5),
        (-48.930421284, 5, -15.5),
        (-35.360842569, 5, -27.5),
        (32.029996703, 5, -18.428932188),
        (-38.289774757, 5, -18.428932188),
        (-31.535627933, 5, 18.428932188),
        (39.102239973, 5, 18.428932188),
        (0, 0, -36.5),
        (-50.935028843, 0, -30.935028843),
        (-56.5, 0, 0),
        (-50.935028843, 0, 30.935028843),
        (0, 0, 36.5),
        (50.935028843, 0, 30.935028843),
        (56.5, 0, 0),
        (50.935028843, 0, -30.935028843),
        (50.935028843, 5, -30.935028843),
        (56.5, 5, 0),
        (50.935028843, 5, 30.935028843),
        (0, 5, 36.5),
        (-50.935028843, 5, 30.935028843),
        (-56.5, 5, 0),
        (-50.935028843, 5, -30.935028843),
        (0, 5, -36.5),
        (-45.553347872, 0, 15.5),
        (45.800532257, 0, -15.5),
        (45.800532257, 5, -15.5),
        (-45.553347872, 5, 15.5),
        (52.5, 0, 0),
        (3.78330602, 0, 29.5),
    ]]
    fillet(fillet3_edges, radius=FILLET3_R)


solid = part.part
